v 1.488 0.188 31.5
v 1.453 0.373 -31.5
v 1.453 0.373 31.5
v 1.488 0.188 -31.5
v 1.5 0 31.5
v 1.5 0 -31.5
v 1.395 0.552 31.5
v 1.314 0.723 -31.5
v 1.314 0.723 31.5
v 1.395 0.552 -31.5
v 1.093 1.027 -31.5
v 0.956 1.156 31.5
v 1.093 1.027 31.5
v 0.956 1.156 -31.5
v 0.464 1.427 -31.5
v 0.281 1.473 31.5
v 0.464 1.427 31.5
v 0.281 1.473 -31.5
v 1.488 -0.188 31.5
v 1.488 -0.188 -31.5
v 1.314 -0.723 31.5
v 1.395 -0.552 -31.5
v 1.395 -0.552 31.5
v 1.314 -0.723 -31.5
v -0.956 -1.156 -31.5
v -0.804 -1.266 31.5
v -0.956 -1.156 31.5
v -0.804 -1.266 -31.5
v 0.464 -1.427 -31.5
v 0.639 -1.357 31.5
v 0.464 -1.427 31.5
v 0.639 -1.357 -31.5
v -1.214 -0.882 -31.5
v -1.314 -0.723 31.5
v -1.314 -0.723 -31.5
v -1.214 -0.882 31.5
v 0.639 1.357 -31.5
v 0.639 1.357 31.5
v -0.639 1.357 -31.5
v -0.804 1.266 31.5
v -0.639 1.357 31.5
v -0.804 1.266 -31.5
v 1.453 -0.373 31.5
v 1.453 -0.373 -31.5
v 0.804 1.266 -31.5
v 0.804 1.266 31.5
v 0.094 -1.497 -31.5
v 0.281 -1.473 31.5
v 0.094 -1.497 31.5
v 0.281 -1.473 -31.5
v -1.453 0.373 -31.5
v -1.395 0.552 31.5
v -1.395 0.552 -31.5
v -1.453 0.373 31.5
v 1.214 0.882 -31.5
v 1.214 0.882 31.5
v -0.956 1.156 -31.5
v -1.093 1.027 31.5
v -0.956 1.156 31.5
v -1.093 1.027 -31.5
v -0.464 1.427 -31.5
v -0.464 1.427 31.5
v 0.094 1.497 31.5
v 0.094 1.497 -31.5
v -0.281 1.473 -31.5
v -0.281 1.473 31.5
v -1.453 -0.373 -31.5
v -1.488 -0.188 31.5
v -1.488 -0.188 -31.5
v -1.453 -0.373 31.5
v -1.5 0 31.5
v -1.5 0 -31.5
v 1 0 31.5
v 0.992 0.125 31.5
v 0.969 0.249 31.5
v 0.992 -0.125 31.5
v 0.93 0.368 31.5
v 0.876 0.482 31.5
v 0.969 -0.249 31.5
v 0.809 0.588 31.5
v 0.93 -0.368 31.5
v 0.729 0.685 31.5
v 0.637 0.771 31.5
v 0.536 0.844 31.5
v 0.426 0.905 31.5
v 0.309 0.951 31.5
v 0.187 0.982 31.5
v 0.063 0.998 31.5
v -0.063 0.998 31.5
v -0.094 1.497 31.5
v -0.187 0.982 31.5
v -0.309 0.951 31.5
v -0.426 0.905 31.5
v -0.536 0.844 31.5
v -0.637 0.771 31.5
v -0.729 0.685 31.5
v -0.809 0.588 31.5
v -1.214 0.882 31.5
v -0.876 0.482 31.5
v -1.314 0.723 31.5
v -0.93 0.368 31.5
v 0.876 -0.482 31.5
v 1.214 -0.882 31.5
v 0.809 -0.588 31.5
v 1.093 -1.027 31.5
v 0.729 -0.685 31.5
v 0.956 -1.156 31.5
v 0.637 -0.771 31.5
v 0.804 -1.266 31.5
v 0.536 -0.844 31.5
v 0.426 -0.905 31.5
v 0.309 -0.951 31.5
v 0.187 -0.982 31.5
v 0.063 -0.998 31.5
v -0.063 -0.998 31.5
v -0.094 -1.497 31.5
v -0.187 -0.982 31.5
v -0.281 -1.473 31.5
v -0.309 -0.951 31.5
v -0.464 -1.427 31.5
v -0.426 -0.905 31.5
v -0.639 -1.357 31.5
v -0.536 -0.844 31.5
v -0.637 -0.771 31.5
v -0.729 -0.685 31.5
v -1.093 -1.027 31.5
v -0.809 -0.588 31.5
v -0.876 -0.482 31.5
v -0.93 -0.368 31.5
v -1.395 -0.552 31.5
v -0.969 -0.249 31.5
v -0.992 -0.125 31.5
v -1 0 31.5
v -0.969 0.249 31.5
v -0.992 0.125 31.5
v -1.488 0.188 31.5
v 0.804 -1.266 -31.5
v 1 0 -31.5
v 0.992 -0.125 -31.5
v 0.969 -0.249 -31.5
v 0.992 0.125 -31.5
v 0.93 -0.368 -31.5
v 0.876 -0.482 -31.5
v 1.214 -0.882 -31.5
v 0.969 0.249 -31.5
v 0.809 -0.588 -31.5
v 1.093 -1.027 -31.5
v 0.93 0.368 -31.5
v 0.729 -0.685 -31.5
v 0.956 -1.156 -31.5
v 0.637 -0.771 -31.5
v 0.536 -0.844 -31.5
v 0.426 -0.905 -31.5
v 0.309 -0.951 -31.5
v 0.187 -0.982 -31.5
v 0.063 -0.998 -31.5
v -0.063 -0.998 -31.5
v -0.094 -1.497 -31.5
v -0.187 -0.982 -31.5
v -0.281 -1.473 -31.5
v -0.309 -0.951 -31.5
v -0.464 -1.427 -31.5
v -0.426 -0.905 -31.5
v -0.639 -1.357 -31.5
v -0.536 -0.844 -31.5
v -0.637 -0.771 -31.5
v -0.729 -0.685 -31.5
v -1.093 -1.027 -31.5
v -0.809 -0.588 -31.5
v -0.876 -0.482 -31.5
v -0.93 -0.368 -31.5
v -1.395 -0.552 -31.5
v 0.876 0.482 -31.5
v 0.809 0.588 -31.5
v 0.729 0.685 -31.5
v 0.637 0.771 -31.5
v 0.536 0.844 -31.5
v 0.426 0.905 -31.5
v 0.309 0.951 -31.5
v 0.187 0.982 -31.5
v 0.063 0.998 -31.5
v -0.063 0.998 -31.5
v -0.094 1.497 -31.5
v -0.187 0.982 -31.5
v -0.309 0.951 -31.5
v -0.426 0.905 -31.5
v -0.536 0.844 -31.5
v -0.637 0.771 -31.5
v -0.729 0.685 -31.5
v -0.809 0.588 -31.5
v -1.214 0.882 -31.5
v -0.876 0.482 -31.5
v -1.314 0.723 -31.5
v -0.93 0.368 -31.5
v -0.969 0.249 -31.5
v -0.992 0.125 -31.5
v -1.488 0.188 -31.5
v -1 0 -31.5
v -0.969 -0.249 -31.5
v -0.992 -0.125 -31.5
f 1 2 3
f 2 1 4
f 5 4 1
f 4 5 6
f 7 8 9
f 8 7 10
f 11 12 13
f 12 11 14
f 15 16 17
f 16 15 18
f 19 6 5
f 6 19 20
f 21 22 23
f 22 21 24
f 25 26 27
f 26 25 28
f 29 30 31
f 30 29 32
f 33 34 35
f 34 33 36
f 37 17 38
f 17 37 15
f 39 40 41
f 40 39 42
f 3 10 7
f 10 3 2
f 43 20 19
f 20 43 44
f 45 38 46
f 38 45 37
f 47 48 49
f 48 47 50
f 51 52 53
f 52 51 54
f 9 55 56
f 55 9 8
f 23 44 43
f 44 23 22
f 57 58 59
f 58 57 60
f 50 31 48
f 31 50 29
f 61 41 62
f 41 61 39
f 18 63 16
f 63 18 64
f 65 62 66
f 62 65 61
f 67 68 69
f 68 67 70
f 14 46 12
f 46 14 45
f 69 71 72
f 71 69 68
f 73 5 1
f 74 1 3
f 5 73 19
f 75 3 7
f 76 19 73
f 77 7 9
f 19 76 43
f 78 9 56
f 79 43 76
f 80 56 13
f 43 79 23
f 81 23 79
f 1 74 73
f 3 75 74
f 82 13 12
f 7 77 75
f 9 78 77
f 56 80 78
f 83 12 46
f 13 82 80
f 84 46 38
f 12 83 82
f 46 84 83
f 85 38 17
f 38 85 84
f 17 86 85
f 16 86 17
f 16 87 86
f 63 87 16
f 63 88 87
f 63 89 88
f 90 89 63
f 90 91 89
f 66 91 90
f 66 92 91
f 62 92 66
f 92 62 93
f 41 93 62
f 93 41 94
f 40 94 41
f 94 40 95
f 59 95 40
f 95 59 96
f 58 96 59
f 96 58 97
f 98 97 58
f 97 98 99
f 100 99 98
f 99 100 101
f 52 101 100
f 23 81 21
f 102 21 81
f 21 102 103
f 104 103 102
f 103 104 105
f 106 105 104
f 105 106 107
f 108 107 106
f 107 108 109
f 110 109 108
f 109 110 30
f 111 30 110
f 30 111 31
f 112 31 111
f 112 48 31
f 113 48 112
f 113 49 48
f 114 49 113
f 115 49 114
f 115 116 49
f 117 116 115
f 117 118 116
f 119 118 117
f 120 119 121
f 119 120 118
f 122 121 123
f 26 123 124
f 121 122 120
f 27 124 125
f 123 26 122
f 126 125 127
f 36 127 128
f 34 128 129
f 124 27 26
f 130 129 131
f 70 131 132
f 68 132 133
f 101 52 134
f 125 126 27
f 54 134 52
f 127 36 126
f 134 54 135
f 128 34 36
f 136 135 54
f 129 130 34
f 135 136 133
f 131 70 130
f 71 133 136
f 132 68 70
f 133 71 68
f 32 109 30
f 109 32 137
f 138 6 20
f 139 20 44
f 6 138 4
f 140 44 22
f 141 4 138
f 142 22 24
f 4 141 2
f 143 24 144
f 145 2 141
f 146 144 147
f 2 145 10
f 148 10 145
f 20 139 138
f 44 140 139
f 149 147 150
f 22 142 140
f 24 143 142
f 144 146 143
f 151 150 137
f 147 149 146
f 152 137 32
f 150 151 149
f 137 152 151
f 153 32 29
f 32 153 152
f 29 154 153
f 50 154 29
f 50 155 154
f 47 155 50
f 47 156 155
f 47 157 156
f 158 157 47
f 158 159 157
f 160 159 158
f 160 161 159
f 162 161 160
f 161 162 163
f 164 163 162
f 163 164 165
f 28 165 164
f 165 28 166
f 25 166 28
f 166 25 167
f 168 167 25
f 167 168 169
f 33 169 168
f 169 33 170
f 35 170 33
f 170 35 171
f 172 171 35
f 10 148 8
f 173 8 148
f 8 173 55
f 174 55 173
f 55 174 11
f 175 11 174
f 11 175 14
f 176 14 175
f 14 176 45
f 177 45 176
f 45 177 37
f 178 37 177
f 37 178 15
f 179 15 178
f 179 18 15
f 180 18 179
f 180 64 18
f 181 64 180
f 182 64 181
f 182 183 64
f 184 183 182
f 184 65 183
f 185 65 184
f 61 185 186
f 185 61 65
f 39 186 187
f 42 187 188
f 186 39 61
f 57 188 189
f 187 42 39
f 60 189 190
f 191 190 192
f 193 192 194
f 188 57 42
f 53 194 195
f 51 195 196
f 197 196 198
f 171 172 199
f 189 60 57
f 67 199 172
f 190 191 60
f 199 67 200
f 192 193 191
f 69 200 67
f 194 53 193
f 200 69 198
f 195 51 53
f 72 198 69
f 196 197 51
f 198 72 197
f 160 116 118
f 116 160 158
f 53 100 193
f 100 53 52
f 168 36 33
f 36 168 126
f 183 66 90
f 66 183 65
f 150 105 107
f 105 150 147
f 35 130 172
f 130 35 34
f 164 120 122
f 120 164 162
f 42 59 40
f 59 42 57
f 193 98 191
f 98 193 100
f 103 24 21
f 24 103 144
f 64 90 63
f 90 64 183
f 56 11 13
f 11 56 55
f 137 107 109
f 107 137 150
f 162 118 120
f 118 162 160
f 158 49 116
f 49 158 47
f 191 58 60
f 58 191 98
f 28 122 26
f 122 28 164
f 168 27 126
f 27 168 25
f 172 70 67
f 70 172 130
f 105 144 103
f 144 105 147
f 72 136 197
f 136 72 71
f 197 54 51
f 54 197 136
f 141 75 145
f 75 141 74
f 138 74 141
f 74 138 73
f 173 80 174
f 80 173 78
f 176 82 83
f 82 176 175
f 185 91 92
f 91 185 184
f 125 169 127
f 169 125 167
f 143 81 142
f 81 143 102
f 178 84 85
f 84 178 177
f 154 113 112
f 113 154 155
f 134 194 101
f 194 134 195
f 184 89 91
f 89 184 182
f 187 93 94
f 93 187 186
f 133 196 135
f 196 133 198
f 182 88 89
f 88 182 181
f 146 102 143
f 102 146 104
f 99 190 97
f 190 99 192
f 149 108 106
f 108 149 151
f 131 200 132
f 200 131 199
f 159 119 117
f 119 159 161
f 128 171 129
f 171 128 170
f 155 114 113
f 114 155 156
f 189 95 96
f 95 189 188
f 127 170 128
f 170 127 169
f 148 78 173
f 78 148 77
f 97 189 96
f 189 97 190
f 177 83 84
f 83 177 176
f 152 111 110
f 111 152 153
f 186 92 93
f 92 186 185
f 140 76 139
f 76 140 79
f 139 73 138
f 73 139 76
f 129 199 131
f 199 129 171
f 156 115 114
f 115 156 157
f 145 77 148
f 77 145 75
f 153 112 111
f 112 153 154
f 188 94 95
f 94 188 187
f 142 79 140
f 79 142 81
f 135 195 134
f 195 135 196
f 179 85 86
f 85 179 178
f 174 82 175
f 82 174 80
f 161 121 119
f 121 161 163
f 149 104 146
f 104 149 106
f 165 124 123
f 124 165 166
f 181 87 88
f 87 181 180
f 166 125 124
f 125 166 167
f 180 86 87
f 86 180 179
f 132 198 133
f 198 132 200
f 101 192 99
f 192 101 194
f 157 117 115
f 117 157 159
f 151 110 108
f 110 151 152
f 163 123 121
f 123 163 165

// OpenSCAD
$fn = 50;


difference() {
	union() {
		translate(v = [0, 0, -31.5000000000]) {
			cylinder(h = 63, r = 1.5000000000);
		}
	}
	union() {
		translate(v = [0, 0, -100.0000000000]) {
			cylinder(h = 200, r = 1.0000000000);
		}
	}
}
